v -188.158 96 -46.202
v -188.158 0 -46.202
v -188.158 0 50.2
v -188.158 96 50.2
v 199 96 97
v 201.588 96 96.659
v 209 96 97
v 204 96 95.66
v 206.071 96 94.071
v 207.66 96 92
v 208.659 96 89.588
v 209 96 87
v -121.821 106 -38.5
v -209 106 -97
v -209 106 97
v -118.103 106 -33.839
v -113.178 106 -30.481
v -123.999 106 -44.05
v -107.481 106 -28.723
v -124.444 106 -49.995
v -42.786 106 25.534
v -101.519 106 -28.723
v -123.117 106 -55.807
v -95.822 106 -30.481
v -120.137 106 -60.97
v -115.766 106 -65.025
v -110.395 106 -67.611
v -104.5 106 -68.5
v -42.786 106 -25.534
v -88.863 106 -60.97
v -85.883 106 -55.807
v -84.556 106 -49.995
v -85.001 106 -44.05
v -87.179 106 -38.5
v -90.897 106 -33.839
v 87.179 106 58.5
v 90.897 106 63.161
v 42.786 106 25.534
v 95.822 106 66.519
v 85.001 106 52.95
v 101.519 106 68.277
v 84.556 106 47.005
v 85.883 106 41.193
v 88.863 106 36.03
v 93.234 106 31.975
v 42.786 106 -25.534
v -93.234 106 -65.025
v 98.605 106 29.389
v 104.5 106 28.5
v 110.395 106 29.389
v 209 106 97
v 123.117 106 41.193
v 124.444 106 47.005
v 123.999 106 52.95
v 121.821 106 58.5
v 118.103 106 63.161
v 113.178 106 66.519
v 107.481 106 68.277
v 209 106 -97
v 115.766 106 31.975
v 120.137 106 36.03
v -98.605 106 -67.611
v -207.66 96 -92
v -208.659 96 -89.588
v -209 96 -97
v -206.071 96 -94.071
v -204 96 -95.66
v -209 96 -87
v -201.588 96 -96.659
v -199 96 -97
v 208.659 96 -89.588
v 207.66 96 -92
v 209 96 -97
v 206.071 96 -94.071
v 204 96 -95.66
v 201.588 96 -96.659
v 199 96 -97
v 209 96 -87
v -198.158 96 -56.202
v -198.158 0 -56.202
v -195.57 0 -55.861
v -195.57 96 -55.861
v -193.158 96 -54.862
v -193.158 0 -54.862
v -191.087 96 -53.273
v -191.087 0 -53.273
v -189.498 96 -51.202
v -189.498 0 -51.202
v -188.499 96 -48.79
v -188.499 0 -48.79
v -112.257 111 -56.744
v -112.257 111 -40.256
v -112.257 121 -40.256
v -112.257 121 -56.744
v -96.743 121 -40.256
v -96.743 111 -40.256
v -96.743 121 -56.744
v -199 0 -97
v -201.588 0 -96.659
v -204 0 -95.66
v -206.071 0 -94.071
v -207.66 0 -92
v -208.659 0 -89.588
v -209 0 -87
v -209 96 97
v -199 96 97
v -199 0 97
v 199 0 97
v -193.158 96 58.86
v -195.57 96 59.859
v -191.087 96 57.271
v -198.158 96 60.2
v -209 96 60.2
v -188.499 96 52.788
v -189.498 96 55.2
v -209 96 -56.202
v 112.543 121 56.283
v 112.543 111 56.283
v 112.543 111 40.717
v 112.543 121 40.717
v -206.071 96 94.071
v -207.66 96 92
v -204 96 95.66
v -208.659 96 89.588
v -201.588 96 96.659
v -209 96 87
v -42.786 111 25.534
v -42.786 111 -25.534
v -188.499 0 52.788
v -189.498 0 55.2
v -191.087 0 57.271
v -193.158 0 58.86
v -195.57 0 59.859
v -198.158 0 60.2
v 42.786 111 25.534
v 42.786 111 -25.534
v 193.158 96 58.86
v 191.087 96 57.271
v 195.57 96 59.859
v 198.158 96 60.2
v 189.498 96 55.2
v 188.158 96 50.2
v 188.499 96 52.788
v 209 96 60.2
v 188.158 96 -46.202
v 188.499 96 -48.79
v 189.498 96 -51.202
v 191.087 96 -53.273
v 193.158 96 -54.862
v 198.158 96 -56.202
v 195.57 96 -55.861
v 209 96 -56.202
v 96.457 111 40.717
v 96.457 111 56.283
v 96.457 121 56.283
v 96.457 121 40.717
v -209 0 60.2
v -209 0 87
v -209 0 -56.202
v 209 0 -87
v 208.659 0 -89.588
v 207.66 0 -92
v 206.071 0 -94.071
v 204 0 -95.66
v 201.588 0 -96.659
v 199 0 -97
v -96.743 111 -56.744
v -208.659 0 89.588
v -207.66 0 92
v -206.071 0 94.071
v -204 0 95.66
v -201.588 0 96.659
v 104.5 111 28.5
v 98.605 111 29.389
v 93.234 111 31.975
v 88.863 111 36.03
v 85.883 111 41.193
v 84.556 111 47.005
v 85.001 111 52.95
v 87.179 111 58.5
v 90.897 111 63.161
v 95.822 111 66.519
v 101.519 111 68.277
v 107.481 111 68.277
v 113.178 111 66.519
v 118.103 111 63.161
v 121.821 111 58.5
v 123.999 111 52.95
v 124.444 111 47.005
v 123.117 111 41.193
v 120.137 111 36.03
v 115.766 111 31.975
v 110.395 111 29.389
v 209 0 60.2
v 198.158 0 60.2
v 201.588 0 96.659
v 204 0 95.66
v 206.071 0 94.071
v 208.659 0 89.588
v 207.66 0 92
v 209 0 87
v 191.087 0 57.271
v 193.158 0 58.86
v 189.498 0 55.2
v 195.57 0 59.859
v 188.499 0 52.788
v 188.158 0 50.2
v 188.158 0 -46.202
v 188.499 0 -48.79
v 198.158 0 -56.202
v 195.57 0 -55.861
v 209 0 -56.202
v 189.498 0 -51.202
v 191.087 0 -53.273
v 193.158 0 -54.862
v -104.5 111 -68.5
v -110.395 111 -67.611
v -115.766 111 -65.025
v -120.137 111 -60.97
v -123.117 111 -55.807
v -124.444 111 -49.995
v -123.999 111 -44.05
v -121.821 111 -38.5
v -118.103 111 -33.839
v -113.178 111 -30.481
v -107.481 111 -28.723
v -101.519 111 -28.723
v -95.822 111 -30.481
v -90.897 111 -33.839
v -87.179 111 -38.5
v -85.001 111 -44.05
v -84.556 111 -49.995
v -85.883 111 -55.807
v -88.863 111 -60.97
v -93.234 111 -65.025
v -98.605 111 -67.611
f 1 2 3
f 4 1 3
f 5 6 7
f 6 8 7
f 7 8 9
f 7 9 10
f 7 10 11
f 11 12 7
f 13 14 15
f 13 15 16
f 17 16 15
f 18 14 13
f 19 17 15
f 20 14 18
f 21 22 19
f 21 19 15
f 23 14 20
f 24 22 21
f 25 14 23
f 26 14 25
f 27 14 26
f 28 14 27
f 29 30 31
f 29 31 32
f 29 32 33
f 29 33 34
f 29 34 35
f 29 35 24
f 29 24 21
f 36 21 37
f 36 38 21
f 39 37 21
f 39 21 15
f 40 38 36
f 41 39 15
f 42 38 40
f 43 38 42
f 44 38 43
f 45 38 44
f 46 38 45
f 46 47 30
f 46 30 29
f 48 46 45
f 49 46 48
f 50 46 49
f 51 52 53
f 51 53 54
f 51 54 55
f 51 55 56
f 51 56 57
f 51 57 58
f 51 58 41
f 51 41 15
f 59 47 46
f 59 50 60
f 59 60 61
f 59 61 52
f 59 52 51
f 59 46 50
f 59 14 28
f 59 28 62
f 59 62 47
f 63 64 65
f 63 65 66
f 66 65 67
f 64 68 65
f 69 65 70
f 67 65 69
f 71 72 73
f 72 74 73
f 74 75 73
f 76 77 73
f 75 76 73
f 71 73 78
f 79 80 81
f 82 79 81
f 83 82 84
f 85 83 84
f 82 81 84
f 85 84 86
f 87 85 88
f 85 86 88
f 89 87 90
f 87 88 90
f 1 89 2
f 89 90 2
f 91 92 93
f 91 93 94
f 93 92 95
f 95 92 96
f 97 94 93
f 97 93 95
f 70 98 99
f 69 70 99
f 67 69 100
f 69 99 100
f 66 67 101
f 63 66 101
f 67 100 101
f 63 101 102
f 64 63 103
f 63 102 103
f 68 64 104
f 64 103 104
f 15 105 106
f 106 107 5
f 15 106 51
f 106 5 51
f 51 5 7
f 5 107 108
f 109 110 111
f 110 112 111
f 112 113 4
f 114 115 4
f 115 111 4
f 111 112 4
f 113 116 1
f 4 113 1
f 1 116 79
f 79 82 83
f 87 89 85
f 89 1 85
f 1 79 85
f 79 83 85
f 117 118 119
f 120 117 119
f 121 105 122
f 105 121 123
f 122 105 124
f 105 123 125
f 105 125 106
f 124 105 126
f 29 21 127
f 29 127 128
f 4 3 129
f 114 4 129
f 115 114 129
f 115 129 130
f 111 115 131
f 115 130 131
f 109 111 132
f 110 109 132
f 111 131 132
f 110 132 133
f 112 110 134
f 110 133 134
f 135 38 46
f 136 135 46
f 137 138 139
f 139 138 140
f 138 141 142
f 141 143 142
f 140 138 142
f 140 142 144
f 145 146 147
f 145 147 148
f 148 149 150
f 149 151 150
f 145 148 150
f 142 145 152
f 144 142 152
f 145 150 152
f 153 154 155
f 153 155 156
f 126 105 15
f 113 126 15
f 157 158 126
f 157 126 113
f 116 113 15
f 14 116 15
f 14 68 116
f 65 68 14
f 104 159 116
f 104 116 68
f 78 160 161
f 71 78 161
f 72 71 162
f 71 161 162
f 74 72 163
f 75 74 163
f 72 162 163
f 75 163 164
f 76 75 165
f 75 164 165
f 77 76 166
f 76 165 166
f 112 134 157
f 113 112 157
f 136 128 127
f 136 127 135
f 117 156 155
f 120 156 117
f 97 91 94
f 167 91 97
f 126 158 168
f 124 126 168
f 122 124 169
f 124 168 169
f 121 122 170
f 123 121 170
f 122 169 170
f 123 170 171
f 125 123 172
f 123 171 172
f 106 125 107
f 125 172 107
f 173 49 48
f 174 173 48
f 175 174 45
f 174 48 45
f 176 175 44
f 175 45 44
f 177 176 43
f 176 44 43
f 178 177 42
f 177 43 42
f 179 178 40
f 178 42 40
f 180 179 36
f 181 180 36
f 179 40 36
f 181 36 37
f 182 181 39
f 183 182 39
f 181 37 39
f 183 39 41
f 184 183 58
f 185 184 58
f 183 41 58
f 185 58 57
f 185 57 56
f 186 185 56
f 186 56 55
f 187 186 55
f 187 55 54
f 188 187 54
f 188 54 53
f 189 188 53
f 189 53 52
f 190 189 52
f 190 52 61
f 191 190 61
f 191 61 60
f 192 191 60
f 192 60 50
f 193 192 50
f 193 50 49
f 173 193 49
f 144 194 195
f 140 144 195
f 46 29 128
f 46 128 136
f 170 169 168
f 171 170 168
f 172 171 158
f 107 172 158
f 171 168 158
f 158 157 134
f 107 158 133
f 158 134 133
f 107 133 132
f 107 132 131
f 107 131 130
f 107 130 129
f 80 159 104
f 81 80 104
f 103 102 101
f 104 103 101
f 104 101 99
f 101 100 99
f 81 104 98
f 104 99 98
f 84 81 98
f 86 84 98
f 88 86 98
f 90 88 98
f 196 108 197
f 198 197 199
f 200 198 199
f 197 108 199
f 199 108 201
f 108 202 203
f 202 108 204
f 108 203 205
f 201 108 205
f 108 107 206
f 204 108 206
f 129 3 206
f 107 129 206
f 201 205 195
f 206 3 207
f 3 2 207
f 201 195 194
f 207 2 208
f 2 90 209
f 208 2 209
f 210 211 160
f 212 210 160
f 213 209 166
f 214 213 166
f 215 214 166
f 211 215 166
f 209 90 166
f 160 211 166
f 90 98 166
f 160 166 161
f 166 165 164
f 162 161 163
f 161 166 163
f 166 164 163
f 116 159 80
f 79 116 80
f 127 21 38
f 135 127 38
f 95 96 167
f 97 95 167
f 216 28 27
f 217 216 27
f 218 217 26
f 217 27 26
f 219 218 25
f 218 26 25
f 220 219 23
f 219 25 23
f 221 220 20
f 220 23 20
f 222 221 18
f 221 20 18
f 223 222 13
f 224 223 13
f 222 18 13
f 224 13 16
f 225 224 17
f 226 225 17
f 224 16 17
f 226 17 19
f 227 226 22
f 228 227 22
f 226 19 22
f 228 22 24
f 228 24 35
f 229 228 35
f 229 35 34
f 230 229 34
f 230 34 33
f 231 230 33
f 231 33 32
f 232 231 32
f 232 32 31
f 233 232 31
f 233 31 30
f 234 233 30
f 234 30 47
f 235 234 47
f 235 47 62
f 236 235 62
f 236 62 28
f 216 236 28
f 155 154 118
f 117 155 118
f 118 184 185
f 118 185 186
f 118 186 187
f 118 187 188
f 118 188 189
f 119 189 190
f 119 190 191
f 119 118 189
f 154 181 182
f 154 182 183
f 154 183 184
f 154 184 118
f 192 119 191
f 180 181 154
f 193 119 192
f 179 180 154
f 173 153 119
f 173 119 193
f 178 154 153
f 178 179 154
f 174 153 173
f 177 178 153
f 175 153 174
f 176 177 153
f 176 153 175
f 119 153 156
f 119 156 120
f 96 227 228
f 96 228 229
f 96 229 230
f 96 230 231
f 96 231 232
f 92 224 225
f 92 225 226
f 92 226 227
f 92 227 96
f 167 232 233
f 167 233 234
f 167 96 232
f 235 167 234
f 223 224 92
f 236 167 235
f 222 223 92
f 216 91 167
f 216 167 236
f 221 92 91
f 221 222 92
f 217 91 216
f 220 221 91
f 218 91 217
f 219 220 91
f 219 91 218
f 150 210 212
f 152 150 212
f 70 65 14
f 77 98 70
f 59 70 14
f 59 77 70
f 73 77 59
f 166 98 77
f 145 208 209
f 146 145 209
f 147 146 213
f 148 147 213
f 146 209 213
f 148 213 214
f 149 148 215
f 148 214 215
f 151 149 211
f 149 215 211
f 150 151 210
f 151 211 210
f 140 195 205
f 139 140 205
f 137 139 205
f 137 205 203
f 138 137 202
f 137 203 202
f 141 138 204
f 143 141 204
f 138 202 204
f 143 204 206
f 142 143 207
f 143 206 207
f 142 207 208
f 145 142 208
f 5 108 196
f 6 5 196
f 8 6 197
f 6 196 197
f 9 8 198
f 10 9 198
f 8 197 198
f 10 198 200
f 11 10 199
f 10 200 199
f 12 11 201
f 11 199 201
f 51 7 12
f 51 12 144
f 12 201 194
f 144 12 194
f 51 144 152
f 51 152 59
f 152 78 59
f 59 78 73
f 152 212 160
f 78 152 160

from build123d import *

# Parameters (mm, degrees)
BOSS_EXTRUDE2_DEPTH = 96
SKETCH2_W           = 418
SKETCH2_H           = 194
BOSS_EXTRUDE3_DEPTH = 10
SKETCH3_R           = 20
BOSS_EXTRUDE5_DEPTH = 15
SKETCH3_4_W         = 15.513986376
SKETCH3_4_H         = 16.487812262
SKETCH3_4_W_2       = 16.085927628
SKETCH3_4_H_2       = 15.566266702
BOSS_EXTRUDE6_DEPTH = 25
SKETCH3_6_R         = 20
BOSS_EXTRUDE7_DEPTH = 15
SKETCH4_W           = 85.572953824
SKETCH4_H           = 51.067730508
BOSS_EXTRUDE8_DEPTH = 15


with BuildPart() as part:
    # Sketch1 → Boss-Extrude2 (new body)
    with BuildSketch(Plane(origin=(0, 0, 0), x_dir=(1, 0, 0), z_dir=(0, 1, 0))):
        with BuildLine():
            Line((-209, -60.2), (-209, -87))
            ThreePointArc((-209, -87), (-206.071067812, -94.071067812), (-199, -97))
            Line((-199, -97), (199, -97))
            ThreePointArc((199, -97), (206.071067812, -94.071067812), (209, -87))
            Line((209, -87), (209, -60.2))
            Line((209, -60.2), (198.157814389, -60.2))
            ThreePointArc((198.157814389, -60.2), (191.086746578, -57.271067812), (188.157814389, -50.2))
            Line((188.157814389, -50.2), (188.157814389, 46.20183264))
            ThreePointArc((188.157814389, 46.20183264), (191.086746578, 53.272900452), (198.157814389, 56.20183264))
            Line((198.157814389, 56.20183264), (209, 56.20183264))
            Line((209, 56.20183264), (209, 87))
            ThreePointArc((209, 87), (206.071067812, 94.071067812), (199, 97))
            Line((199, 97), (-199, 97))
            ThreePointArc((-199, 97), (-206.071067812, 94.071067812), (-209, 87))
            Line((-209, 87), (-209, 56.20183264))
            Line((-209, 56.20183264), (-198.157814389, 56.20183264))
            ThreePointArc((-198.157814389, 56.20183264), (-191.086746578, 53.272900452), (-188.157814389, 46.20183264))
            Line((-188.157814389, 46.20183264), (-188.157814389, -50.2))
            ThreePointArc((-188.157814389, -50.2), (-191.086746578, -57.271067812), (-198.157814389, -60.2))
            Line((-198.157814389, -60.2), (-209, -60.2))
        make_face()
    extrude(amount=BOSS_EXTRUDE2_DEPTH)

    # Sketch2 → Boss-Extrude3 (add)
    with BuildSketch(Plane(origin=(0, 96, 0), x_dir=(1, 0, 0), z_dir=(0, 1, 0))):
        Rectangle(SKETCH2_W, SKETCH2_H)
    extrude(amount=BOSS_EXTRUDE3_DEPTH)

    # Sketch3 → Boss-Extrude5 (add)
    with BuildSketch(Plane(origin=(0, 96, 0), x_dir=(1, 0, 0), z_dir=(0, 1, 0))):
        with Locations((-104.5, 48.5)):
            Circle(SKETCH3_R)
    extrude(amount=BOSS_EXTRUDE5_DEPTH)

    # Sketch3<4> → Boss-Extrude6 (add)
    with BuildSketch(Plane(origin=(0, 96, 0), x_dir=(1, 0, 0), z_dir=(0, 1, 0))):
        with Locations((-104.5, 48.5)):
            Rectangle(SKETCH3_4_W, SKETCH3_4_H)
        with Locations((104.5, -48.5)):
            Rectangle(SKETCH3_4_W_2, SKETCH3_4_H_2)
    extrude(amount=BOSS_EXTRUDE6_DEPTH)

    # Sketch3<6> → Boss-Extrude7 (add)
    with BuildSketch(Plane(origin=(0, 96, 0), x_dir=(1, 0, 0), z_dir=(0, 1, 0))):
        with Locations((104.5, -48.5)):
            Circle(SKETCH3_6_R)
    extrude(amount=BOSS_EXTRUDE7_DEPTH)

    # Sketch4 → Boss-Extrude8 (add)
    with BuildSketch(Plane(origin=(0, 96, 0), x_dir=(1, 0, 0), z_dir=(0, 1, 0))):
        Rectangle(SKETCH4_W, SKETCH4_H)
    extrude(amount=BOSS_EXTRUDE8_DEPTH)


solid = part.part
